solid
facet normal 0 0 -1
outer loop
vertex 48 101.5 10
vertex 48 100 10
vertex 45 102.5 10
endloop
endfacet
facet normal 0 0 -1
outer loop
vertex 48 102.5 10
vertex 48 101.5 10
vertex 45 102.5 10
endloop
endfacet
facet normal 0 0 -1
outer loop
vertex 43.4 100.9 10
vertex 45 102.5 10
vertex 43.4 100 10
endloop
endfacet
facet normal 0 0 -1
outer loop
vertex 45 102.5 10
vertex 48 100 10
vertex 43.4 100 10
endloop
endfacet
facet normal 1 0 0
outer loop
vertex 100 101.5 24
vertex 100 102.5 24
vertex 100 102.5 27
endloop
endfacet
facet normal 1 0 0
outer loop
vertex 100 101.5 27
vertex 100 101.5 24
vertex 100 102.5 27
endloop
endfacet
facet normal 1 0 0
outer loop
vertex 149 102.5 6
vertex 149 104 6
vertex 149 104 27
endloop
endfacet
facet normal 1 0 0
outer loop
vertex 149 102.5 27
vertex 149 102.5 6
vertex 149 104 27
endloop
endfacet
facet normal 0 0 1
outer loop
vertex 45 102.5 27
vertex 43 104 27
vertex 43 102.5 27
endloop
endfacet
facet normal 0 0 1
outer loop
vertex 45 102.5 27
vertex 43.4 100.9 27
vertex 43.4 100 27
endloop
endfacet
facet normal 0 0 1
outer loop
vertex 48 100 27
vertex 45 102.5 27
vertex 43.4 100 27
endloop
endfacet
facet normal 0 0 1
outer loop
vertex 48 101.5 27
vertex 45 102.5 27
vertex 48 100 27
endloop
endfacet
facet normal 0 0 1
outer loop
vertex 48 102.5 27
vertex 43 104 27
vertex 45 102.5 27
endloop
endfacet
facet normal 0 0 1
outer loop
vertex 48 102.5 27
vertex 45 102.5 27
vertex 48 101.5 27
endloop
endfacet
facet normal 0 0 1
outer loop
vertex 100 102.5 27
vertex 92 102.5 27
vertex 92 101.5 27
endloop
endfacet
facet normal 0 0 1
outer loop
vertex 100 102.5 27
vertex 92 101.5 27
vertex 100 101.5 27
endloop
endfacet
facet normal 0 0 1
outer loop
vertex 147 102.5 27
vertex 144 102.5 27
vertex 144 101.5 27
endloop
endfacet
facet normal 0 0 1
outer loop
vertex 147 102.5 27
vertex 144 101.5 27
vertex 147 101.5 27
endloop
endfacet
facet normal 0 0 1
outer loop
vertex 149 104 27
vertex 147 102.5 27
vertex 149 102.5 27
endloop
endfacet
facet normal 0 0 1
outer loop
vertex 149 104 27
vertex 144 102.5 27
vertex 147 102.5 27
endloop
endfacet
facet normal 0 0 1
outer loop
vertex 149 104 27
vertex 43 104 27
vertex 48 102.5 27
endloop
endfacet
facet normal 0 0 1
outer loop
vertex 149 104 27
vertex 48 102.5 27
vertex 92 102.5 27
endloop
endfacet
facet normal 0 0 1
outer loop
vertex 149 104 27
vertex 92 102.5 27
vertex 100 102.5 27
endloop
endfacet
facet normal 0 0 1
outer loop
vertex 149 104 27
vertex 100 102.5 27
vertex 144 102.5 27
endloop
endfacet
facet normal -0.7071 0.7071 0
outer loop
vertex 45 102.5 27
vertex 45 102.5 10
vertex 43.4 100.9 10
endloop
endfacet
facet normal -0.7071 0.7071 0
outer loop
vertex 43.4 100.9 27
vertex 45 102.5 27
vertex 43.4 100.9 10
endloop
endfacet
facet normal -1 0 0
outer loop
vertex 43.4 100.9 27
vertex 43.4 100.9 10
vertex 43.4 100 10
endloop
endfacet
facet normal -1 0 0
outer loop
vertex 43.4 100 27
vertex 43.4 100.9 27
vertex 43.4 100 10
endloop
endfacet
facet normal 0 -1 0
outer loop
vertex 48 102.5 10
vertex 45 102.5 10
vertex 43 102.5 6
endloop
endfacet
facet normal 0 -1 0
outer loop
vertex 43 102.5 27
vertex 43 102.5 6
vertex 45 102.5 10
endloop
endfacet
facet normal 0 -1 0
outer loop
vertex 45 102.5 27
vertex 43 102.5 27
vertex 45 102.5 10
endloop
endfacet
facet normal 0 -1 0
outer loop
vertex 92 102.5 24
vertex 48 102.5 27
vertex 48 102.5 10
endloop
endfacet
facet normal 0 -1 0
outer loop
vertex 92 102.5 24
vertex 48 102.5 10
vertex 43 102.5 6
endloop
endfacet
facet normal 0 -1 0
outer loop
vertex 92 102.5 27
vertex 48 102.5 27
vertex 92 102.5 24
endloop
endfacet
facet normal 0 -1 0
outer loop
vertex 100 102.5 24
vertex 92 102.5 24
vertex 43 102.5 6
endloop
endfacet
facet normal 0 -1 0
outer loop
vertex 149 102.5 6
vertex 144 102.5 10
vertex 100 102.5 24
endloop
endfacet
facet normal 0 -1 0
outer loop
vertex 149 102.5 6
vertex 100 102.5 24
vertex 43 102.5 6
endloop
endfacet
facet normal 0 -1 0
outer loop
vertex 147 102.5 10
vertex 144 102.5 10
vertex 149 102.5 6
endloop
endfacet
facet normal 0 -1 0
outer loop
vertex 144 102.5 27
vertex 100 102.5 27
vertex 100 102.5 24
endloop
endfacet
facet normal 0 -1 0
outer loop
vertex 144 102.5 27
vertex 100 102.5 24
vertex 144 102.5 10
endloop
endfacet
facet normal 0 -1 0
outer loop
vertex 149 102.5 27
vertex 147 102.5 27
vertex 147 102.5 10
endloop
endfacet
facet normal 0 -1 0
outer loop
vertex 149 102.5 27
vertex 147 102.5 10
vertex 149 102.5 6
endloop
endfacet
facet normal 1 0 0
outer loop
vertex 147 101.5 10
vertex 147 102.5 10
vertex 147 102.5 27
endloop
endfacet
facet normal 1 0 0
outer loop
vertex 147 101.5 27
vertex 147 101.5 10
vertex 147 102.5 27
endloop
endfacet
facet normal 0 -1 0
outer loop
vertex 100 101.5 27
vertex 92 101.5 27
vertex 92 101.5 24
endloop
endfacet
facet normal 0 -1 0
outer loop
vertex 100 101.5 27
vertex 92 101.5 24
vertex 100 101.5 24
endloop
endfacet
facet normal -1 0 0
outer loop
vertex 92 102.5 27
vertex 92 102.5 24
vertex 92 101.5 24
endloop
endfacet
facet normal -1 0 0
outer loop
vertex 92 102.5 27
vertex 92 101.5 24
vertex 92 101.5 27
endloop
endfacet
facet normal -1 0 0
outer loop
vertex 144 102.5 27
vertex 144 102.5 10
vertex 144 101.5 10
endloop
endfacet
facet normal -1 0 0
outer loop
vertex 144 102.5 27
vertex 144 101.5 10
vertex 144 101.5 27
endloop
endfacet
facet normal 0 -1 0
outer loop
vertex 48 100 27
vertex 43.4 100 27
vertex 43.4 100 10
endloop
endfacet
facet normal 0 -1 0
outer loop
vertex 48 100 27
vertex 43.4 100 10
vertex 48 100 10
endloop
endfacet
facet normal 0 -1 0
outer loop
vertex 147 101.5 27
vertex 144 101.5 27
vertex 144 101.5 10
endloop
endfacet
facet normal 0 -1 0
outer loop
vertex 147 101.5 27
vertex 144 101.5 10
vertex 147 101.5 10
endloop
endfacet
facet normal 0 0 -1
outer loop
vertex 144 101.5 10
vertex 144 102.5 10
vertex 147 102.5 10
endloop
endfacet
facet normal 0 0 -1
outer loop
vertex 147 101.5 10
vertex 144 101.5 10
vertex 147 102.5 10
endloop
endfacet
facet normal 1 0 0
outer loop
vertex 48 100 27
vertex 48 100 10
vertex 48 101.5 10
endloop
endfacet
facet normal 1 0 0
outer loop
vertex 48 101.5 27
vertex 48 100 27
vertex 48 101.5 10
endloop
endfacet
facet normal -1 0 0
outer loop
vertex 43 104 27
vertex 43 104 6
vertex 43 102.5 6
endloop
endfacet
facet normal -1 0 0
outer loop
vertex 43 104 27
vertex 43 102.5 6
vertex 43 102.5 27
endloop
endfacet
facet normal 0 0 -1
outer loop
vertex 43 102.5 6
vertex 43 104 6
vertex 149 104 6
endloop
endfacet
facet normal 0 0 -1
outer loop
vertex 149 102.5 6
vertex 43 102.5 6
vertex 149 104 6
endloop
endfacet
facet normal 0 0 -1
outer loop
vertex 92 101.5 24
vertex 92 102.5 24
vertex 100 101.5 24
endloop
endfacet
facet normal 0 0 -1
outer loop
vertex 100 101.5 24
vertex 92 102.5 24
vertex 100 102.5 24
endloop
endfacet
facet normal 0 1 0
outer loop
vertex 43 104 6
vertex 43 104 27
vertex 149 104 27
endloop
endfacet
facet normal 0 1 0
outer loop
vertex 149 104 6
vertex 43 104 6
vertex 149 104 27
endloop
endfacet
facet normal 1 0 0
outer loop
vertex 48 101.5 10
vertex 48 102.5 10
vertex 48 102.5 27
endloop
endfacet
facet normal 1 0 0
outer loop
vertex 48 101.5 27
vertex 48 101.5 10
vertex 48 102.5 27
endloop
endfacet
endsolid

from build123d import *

# Parameters (mm, degrees)
SKETCH026_W   = 106
SKETCH026_H   = 21
PAD_DEPTH     = 1.5
SKETCH027_W   = 3
SKETCH027_H   = 17
SKETCH027_W_2 = 8
SKETCH027_H_2 = 3
PAD012_DEPTH  = 1
PAD014_DEPTH  = 17


with BuildPart() as part:
    # Sketch026 → Pad (new body)
    with BuildSketch(Plane.XZ.offset(-104)):
        with Locations((-96, 16.5)):
            Rectangle(SKETCH026_W, SKETCH026_H)
    extrude(amount=PAD_DEPTH)

    # Sketch027 (on Face6 of Pad) → Pad012 (join)
    with BuildSketch(Plane.XZ.offset(-102.5)):
        with Locations((-145.5, 18.5)):
            Rectangle(SKETCH027_W, SKETCH027_H)
        with Locations((-46.5, 18.5)):
            Rectangle(SKETCH027_W, SKETCH027_H)
        with Locations((-96, 25.5)):
            Rectangle(SKETCH027_W_2, SKETCH027_H_2)
    extrude(amount=PAD012_DEPTH)

    # Sketch030 (on Face13 of Pad012) → Pad014 (join)
    with BuildSketch(Plane(origin=(0, 0, 10), x_dir=(1, 0, 0), z_dir=(0, 0, -1))):
        Polygon((-147.000002, -102.500002), (-148.600002, -100.900002), (-148.600002, -100.000001), (-144, -100), (-144.000002, -102.500002), align=None)
    extrude(amount=-PAD014_DEPTH)


with BuildPart() as part_1:
    # Body011 placement: moved
    add(part.part.moved(Location((192, 0, 0))))


solid = part_1.part
